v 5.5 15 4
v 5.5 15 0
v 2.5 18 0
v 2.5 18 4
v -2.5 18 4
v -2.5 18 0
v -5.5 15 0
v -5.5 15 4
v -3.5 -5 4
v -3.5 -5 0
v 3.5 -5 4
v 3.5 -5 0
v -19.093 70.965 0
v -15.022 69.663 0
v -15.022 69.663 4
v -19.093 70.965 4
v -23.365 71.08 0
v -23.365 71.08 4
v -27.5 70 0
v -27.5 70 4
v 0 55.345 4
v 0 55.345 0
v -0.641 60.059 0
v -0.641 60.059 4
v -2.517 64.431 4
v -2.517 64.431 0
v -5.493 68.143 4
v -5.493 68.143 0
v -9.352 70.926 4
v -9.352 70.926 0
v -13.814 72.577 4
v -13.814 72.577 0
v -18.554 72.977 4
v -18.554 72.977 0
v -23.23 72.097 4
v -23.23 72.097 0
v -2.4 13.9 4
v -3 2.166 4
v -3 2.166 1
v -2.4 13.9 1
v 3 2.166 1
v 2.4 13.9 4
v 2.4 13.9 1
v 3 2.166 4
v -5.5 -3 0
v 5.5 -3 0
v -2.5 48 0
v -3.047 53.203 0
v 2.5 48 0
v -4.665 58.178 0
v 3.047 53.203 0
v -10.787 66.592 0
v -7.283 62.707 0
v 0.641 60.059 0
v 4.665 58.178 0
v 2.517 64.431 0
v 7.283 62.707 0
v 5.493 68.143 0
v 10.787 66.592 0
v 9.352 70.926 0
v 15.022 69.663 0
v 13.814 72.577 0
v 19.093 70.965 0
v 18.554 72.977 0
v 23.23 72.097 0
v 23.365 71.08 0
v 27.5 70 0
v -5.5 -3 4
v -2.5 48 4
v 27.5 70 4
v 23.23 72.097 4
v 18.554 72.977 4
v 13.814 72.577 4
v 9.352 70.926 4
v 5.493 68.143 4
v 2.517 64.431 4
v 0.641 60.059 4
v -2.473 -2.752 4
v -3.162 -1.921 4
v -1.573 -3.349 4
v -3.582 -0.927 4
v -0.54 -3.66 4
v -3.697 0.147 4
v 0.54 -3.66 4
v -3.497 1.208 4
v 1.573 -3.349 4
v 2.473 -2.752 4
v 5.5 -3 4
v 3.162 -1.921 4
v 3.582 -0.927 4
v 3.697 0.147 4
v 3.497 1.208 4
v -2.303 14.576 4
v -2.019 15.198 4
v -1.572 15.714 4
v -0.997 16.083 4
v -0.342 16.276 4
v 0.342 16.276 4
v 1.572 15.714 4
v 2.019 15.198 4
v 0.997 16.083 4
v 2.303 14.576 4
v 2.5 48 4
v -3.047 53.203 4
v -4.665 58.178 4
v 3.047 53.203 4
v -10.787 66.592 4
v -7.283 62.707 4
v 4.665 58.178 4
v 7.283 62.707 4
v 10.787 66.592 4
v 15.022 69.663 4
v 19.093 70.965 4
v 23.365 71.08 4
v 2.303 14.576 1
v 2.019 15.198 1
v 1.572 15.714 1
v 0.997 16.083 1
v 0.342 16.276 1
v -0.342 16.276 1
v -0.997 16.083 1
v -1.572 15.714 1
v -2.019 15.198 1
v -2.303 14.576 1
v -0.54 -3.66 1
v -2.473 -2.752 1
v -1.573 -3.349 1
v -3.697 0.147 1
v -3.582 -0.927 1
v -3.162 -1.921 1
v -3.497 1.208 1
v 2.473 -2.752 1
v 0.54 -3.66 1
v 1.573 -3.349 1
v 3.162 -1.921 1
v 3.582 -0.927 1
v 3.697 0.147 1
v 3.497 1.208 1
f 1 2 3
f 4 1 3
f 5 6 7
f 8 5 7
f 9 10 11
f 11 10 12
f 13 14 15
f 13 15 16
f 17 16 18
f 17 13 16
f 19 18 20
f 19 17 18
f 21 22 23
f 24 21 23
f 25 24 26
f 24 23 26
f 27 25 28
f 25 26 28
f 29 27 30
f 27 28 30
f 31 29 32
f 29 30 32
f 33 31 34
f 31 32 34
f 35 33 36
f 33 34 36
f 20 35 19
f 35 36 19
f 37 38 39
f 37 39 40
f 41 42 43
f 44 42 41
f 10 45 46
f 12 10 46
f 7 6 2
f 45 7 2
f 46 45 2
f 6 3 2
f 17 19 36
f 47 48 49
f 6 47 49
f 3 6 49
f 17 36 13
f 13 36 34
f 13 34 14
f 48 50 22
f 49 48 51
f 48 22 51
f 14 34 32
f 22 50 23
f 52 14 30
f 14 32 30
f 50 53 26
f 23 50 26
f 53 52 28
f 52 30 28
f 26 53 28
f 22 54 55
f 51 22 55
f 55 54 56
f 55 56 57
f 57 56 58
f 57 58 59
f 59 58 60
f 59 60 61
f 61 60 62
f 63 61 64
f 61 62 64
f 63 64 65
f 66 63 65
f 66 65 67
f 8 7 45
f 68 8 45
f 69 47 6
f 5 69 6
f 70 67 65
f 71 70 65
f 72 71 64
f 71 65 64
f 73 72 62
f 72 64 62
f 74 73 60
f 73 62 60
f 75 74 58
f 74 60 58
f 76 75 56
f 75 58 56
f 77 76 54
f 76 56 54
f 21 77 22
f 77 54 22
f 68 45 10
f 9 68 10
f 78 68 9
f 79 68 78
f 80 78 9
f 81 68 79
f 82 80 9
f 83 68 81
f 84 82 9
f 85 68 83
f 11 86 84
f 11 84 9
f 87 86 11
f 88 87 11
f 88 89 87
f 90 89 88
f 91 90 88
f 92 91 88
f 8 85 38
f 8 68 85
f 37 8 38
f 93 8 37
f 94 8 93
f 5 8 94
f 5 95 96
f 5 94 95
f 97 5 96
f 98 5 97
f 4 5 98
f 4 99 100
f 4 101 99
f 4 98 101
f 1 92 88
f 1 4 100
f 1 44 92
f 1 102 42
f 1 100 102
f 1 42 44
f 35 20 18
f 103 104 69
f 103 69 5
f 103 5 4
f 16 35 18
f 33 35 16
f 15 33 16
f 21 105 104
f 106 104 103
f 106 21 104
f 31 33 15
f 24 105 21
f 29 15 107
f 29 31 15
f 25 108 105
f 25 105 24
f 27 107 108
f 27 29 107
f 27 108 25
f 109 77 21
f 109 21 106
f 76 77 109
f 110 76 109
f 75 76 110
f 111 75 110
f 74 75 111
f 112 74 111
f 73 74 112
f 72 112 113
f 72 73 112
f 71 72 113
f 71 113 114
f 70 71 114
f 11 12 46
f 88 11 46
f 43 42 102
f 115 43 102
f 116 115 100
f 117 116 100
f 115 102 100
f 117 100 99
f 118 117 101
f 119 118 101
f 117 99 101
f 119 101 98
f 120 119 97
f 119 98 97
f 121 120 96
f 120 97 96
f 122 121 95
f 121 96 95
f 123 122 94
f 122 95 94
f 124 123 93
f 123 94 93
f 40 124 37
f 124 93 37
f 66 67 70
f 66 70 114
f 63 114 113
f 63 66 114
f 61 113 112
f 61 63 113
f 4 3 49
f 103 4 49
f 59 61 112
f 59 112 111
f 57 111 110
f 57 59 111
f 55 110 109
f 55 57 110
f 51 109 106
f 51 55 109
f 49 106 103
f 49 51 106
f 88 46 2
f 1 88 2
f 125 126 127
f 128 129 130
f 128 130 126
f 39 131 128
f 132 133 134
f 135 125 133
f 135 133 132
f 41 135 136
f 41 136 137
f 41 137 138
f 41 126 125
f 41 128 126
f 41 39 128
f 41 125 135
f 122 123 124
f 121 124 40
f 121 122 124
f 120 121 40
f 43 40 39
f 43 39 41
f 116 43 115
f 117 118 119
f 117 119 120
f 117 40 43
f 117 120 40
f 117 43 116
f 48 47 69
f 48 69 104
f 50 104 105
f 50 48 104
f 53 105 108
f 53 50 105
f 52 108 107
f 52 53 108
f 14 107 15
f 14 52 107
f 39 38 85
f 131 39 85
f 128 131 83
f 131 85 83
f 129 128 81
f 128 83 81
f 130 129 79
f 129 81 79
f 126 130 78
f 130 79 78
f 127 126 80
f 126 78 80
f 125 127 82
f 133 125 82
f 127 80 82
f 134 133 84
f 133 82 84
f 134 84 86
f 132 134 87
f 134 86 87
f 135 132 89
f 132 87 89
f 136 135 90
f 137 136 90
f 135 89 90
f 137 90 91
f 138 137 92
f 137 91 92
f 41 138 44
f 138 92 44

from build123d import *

# Parameters (mm, degrees)
PAD_DEPTH    = 4
POCKET_DEPTH = 3


with BuildPart() as part:
    # Sketch → Pad (new body)
    with BuildSketch(Plane.XY):
        with BuildLine():
            Line((2.5, 18), (2.5, 48))
            ThreePointArc((15.021703, 69.663151), (5.855631, 60.510847), (2.5, 48))
            ThreePointArc((27.5, 70), (21.224622, 71.173643), (15.021703, 69.663151))
            ThreePointArc((27.5, 70), (9.351891, 70.925767), (0, 55.345233))
            ThreePointArc((0, 55.345233), (-9.351891, 70.925767), (-27.5, 70))
            ThreePointArc((-15.021703, 69.663151), (-21.224622, 71.173643), (-27.5, 70))
            ThreePointArc((-2.5, 48), (-5.855631, 60.510847), (-15.021703, 69.663151))
            Line((-2.5, 48), (-2.5, 18))
            Line((-2.5, 18), (-5.5, 15))
            Line((-5.5, 15), (-5.5, -3))
            Line((-5.5, -3), (-3.5, -5))
            Line((-3.5, -5), (3.5, -5))
            Line((3.5, -5), (5.5, -3))
            Line((5.5, -3), (5.5, 15))
            Line((5.5, 15), (2.5, 18))
        make_face()
    extrude(amount=PAD_DEPTH)

    # Sketch001 → Pocket (cut)
    with BuildSketch(Plane.XY.offset(4)):
        with BuildLine():
            ThreePointArc((-3, 2.165641), (0, -3.7), (3, 2.165641))
            Line((2.4, 13.90001), (3, 2.165641))
            ThreePointArc((2.4, 13.90001), (0, 16.3), (-2.4, 13.90001))
            Line((-3, 2.165641), (-2.4, 13.90001))
        make_face()
    extrude(amount=-POCKET_DEPTH, mode=Mode.SUBTRACT)


solid = part.part
